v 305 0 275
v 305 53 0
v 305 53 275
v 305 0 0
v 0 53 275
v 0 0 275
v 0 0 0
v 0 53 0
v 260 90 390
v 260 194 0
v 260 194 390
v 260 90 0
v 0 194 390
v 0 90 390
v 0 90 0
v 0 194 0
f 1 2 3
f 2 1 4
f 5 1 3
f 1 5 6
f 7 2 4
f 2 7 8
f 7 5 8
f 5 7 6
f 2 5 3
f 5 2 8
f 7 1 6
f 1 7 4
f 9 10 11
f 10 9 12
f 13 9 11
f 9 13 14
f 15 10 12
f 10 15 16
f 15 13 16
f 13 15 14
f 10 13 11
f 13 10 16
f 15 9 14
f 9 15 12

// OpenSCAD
ps4();
translate([0,90,0]) ps5();

module ps5() {
  //PlayStation 5 has a height of 15.4” (390 mm), width of 4.1” (104 mm), depth of 10.2" (260 mm)
  cube([260,104,390]);
}


module ps4() {
  //The PlayStation 4 has a height of 2.09” (53 mm), depth of 12” (305 mm), width of 10.8” (275 mm)
  cube([305,53,275]);
}
